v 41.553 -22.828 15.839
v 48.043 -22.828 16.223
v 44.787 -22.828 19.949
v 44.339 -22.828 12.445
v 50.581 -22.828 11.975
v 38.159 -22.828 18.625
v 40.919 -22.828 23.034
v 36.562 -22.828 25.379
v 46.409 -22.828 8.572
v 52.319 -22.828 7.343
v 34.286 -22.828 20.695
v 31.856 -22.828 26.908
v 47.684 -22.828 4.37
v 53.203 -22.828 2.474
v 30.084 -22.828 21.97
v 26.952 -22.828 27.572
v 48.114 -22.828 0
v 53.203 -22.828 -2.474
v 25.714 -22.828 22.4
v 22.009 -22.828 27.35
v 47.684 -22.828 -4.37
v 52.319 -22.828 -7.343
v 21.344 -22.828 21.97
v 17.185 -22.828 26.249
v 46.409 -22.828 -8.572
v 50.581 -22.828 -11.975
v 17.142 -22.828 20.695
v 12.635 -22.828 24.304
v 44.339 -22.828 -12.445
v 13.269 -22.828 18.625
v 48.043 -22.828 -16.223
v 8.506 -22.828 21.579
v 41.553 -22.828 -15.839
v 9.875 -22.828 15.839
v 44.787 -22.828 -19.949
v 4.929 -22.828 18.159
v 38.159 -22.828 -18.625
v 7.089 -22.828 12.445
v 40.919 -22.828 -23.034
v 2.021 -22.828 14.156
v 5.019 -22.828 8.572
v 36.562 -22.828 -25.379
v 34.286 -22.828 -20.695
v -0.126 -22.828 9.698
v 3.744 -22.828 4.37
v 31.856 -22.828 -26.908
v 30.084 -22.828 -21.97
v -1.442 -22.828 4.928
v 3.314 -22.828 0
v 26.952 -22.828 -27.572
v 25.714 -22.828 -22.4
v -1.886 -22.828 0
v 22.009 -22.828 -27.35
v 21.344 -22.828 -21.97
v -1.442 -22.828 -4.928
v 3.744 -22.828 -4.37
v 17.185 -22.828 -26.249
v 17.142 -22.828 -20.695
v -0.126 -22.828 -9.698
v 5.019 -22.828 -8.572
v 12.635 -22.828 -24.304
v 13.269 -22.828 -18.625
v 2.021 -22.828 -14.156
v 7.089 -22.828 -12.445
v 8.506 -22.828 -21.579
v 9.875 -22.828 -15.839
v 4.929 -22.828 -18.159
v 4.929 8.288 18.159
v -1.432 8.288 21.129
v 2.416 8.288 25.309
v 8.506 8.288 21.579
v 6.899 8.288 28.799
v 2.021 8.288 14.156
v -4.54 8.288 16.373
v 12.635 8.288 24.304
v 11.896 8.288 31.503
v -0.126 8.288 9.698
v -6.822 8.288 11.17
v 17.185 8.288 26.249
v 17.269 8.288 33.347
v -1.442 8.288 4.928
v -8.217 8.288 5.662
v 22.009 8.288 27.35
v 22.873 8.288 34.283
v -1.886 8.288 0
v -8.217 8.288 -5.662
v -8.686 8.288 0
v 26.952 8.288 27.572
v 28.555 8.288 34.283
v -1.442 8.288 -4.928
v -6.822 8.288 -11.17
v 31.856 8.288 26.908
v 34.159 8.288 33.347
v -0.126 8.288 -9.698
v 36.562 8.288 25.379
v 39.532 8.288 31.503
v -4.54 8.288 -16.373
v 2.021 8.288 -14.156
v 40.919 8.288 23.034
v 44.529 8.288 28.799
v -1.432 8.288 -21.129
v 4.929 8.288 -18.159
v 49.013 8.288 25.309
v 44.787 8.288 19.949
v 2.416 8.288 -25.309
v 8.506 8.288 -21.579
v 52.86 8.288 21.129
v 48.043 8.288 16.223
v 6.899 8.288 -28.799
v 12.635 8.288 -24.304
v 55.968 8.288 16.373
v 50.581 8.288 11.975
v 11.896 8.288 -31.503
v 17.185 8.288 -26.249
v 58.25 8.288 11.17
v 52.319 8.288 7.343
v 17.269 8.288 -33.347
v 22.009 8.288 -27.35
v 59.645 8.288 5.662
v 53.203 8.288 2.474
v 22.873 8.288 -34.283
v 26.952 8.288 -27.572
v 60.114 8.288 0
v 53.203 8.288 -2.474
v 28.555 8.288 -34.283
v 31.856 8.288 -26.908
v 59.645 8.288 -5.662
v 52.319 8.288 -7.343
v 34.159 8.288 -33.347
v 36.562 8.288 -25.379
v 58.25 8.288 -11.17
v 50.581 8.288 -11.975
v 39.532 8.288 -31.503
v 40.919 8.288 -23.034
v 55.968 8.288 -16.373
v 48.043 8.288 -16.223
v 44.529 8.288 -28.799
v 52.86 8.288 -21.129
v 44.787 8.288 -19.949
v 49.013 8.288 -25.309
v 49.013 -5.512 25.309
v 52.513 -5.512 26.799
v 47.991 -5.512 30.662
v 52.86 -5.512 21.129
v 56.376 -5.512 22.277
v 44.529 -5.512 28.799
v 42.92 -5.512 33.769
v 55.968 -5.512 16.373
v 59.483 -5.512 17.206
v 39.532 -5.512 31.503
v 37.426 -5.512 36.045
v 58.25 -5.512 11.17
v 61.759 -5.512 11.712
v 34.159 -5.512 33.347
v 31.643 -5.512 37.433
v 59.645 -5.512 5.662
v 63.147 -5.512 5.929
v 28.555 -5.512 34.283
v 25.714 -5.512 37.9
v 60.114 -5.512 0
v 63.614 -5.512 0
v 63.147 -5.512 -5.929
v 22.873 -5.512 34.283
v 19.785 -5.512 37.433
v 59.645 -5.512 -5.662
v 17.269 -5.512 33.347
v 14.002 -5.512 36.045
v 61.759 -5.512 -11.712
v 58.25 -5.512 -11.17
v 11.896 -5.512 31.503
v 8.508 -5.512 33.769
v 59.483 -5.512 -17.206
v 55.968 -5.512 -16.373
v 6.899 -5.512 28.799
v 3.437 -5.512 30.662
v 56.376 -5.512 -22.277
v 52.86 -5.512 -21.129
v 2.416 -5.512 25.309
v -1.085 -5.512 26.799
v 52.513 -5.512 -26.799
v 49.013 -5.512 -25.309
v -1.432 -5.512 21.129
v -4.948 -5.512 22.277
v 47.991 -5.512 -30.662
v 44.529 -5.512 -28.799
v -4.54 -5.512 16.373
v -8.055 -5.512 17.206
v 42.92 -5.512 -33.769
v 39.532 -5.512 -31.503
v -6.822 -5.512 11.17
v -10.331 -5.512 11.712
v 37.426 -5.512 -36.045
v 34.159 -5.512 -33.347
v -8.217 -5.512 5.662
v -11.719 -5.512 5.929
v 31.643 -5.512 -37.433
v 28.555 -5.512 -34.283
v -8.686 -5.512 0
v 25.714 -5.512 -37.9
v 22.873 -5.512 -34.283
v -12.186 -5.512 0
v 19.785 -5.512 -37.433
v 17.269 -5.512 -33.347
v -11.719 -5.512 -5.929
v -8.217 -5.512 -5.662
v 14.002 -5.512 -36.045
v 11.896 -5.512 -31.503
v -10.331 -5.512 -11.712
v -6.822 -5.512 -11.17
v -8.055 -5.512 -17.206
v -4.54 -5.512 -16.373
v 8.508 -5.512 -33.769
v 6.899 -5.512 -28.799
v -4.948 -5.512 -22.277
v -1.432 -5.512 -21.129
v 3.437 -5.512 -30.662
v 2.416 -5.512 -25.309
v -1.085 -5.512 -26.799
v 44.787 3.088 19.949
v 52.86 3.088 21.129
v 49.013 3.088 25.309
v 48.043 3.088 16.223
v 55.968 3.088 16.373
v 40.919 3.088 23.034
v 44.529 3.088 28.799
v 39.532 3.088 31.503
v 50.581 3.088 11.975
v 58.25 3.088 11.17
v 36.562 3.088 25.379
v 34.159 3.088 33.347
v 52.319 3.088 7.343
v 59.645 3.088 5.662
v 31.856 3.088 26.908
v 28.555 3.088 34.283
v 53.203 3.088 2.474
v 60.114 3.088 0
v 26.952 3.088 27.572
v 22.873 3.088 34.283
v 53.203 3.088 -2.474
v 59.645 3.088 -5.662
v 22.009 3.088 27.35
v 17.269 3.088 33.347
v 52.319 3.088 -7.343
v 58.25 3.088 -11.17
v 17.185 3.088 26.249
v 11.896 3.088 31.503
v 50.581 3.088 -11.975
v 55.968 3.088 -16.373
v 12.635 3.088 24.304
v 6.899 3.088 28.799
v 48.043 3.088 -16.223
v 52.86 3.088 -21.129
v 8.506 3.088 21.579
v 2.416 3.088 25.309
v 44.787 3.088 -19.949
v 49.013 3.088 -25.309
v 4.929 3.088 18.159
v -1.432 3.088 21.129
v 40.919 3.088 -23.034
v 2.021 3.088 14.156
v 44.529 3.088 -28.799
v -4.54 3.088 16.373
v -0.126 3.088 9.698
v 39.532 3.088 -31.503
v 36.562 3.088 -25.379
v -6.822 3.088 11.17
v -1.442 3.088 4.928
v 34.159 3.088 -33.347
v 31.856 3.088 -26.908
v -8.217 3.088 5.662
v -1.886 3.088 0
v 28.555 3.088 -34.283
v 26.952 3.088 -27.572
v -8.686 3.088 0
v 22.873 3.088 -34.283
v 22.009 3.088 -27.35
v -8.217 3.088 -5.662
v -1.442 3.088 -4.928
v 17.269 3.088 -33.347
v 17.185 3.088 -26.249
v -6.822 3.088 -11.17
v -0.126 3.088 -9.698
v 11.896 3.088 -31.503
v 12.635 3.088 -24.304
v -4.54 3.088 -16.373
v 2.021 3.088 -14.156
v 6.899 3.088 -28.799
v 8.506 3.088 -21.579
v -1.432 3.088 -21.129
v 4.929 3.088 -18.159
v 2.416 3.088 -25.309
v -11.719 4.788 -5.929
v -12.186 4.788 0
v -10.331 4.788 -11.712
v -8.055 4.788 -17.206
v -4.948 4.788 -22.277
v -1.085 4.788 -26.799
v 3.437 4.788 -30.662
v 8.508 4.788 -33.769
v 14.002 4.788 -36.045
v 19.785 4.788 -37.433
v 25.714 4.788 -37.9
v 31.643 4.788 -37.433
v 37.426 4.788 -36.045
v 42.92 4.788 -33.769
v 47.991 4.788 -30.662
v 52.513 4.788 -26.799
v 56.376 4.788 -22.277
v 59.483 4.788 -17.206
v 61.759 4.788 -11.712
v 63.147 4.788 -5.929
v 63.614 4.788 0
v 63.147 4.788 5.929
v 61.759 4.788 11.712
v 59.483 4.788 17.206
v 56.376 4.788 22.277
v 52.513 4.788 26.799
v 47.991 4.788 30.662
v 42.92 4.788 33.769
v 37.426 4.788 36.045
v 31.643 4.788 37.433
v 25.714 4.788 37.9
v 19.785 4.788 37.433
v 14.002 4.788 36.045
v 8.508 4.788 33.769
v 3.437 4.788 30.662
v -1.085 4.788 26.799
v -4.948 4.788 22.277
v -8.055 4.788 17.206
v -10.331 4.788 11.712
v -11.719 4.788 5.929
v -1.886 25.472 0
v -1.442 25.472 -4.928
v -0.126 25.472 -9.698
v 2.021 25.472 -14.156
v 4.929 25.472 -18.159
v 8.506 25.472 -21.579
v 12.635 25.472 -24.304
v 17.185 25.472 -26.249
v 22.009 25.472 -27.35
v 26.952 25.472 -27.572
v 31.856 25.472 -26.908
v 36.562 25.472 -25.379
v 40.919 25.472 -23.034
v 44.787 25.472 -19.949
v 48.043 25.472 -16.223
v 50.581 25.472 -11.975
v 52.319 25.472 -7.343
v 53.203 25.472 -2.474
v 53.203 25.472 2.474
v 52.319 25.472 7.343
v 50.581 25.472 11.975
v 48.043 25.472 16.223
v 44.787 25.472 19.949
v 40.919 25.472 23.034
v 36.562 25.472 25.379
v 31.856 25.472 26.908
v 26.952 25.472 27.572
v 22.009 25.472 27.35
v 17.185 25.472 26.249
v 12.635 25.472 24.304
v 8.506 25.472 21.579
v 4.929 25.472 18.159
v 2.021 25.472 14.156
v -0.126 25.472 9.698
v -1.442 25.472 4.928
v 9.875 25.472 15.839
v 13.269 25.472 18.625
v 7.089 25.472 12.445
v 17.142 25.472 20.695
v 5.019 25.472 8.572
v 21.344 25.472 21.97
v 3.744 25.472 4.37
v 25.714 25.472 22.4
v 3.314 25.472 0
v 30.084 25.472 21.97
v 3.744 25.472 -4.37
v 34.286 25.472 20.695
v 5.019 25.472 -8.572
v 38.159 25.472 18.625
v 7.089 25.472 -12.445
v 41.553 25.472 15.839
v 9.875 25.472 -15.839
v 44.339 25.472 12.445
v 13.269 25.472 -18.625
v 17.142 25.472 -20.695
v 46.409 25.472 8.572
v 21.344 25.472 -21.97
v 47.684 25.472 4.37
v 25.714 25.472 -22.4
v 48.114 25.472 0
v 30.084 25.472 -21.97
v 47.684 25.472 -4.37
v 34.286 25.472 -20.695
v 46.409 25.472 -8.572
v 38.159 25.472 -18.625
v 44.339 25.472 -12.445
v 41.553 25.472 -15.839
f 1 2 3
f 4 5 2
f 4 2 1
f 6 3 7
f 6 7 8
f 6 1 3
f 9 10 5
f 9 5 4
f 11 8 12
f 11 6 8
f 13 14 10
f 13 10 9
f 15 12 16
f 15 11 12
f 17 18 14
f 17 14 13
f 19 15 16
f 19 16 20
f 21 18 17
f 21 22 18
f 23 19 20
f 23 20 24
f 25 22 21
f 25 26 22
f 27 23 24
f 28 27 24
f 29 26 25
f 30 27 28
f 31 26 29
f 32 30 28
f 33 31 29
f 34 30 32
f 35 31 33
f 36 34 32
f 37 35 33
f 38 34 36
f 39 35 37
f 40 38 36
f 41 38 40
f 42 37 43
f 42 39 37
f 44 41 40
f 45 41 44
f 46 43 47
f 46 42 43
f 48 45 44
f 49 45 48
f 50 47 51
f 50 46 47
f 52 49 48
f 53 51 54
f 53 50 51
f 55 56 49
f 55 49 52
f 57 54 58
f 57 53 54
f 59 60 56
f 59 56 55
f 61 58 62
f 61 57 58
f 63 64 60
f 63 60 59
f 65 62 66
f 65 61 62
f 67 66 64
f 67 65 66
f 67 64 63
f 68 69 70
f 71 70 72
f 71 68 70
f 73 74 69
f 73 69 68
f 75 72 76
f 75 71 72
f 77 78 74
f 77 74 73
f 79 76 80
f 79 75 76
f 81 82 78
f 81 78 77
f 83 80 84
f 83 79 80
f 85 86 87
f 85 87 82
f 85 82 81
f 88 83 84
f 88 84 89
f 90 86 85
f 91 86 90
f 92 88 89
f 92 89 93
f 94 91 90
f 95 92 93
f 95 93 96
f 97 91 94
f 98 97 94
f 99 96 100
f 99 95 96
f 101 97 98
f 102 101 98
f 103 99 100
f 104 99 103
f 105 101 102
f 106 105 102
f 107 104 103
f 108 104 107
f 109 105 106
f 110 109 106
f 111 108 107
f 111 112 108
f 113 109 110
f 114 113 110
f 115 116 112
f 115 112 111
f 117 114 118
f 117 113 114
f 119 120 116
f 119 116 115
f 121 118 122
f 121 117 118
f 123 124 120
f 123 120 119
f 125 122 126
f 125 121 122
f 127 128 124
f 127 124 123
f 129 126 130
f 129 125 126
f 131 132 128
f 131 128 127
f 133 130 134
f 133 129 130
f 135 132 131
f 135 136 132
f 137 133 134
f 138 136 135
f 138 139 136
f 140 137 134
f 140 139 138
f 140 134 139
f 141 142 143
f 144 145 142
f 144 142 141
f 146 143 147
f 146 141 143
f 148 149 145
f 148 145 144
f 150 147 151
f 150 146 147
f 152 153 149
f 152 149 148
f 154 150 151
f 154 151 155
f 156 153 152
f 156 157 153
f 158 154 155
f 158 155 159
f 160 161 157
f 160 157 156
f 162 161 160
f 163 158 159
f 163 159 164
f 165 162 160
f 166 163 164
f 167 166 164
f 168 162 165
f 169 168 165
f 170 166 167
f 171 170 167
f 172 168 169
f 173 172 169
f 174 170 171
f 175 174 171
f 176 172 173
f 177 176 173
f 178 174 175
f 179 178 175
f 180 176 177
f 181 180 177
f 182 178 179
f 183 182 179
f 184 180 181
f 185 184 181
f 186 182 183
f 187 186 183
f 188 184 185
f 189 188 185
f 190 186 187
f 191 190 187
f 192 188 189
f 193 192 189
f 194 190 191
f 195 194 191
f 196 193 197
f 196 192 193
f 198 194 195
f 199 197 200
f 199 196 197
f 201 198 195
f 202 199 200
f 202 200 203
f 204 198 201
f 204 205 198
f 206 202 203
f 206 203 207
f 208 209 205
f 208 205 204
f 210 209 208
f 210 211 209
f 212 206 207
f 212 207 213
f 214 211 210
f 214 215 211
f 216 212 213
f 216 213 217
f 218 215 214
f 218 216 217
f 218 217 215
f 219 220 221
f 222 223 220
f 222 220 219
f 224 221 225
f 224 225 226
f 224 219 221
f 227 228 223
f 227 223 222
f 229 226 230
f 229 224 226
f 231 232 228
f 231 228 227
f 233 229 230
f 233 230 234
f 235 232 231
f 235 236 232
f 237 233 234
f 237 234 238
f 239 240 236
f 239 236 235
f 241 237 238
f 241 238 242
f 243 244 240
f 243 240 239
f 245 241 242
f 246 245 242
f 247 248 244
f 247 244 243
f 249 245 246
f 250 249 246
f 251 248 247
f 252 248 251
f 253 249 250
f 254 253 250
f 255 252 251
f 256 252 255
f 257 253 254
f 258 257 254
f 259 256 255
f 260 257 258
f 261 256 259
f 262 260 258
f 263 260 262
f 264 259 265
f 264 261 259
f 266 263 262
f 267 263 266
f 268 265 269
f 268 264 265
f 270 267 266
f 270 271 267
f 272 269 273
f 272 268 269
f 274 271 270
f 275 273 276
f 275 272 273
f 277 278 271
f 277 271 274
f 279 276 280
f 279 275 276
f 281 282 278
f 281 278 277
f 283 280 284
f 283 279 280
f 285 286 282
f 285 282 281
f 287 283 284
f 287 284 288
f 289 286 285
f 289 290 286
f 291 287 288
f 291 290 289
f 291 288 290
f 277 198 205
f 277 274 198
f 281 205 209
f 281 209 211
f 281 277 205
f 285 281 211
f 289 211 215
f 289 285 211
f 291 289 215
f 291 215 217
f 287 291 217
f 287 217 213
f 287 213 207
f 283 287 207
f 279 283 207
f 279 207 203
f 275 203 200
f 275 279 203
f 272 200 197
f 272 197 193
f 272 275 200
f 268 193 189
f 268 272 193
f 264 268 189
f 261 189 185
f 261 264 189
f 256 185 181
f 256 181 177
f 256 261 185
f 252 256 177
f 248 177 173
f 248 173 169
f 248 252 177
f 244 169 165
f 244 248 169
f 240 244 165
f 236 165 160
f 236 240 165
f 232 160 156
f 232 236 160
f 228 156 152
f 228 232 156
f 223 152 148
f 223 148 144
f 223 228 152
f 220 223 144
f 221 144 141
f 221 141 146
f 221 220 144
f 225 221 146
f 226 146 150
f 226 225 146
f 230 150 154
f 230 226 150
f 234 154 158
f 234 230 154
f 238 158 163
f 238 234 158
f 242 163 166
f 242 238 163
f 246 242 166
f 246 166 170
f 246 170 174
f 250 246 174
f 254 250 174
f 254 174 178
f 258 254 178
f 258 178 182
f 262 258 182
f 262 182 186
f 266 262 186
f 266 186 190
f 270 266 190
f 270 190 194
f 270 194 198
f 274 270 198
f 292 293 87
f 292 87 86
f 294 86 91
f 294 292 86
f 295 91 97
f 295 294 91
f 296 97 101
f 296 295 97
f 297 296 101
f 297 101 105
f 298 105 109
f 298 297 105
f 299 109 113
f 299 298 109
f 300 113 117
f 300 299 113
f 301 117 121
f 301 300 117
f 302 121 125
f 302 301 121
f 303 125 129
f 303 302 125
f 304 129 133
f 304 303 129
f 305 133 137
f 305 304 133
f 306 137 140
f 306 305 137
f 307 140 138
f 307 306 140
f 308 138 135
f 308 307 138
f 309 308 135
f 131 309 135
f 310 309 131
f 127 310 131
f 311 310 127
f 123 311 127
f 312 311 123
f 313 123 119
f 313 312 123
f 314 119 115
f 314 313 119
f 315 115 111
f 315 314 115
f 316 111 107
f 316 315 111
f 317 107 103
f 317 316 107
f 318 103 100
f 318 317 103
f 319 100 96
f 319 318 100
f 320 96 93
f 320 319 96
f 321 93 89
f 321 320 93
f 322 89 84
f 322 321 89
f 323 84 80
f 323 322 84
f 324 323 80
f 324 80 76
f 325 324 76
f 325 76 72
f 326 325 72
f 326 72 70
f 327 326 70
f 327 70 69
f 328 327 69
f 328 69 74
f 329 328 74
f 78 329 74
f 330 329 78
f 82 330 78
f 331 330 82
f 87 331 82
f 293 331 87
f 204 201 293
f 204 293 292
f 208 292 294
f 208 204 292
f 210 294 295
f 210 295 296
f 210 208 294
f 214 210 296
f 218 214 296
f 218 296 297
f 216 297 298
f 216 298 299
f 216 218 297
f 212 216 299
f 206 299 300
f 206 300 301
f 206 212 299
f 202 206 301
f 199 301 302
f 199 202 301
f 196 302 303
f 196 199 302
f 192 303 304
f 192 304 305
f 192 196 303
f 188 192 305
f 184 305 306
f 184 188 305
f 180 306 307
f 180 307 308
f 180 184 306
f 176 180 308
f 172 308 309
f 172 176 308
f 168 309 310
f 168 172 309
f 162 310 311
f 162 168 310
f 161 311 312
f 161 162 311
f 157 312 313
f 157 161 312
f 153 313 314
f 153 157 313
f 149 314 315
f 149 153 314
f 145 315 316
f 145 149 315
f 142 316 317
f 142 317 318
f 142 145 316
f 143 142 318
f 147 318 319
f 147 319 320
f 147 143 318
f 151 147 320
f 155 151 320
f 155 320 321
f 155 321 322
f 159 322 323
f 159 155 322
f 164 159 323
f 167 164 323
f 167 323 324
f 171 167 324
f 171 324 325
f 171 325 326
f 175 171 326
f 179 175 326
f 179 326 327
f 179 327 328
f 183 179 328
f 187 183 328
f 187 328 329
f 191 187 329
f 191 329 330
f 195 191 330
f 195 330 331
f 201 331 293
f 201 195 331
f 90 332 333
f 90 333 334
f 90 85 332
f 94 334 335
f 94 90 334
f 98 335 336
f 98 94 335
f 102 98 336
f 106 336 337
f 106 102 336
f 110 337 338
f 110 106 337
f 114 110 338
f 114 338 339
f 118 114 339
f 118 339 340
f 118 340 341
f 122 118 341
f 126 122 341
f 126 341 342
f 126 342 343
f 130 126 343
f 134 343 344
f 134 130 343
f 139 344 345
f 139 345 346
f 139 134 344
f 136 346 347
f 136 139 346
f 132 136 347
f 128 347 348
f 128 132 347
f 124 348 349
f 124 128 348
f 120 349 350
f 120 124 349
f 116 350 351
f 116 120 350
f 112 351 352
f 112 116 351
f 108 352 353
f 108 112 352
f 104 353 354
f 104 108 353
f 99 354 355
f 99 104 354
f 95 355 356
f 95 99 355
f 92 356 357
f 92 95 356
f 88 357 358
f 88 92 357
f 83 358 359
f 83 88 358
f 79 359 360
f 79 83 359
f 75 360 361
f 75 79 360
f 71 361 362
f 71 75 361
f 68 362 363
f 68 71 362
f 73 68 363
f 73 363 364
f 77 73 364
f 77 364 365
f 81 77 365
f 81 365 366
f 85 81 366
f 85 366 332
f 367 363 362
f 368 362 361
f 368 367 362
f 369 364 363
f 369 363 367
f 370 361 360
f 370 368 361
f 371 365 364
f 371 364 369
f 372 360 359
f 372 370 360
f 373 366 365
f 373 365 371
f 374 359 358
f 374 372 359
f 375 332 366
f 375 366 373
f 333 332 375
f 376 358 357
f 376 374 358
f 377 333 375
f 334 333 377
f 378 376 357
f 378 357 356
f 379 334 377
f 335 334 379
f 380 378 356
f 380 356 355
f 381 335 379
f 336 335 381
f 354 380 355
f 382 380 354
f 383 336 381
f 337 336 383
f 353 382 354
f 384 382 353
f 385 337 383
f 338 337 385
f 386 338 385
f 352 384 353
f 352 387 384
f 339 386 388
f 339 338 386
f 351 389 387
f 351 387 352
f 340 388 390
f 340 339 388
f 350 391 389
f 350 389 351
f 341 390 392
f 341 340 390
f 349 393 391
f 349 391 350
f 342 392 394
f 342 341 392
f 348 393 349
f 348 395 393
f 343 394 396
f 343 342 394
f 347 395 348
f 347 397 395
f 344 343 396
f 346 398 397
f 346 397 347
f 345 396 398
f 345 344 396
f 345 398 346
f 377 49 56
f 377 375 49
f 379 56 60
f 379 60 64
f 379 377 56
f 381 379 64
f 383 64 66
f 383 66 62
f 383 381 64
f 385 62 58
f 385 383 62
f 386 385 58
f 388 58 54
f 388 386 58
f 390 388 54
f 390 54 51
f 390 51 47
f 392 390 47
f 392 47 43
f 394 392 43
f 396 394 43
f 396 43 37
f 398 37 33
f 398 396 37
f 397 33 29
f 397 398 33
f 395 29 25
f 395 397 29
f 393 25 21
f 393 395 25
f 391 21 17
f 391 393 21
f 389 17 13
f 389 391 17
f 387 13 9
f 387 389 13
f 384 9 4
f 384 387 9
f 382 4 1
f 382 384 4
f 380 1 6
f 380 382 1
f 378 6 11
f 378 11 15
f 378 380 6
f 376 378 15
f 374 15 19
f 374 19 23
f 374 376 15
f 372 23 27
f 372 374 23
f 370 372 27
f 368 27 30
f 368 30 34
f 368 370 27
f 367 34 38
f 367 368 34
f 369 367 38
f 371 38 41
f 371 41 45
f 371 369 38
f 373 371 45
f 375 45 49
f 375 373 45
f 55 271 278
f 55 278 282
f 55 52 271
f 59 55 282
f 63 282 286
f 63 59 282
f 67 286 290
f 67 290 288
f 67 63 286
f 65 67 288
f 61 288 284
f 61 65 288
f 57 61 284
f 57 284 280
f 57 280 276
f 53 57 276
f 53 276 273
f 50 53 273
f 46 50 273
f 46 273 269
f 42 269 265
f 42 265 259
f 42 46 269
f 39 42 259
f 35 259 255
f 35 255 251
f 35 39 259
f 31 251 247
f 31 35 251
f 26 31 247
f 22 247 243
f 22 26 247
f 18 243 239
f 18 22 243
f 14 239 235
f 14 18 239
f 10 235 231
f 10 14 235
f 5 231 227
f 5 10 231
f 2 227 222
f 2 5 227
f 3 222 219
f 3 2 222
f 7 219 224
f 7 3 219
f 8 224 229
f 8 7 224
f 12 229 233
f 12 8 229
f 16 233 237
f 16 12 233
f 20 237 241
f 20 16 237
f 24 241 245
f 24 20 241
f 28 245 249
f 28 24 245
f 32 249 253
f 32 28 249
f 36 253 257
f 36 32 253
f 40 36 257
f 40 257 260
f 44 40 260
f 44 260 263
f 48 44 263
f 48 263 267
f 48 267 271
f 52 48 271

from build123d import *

# Parameters (mm, degrees)
CHAMFER1_SIZE = 3.5


with BuildPart() as part:
    # Sketch1 → Revolve2 (revolve)
    with BuildSketch(Plane.XY):
        Polygon((-8.685956571, 3.088170612), (-1.885956571, 3.088170612), (-1.885956571, -22.827972222), (3.314043429, -22.827972222), (3.314043429, 25.472027778), (-1.885956571, 25.472027778), (-1.885956571, 8.288170612), (-12.185956571, 8.288170612), (-12.185956571, 3.088170612), (-12.185956571, -5.511829388), (-8.685956571, -5.511829388), align=None)
    revolve(axis=Axis((25.714043429, 25.472027778, 0), (0, -1, 0)))

    # Chamfer1
    chamfer1_edges = [part.edges().sort_by_distance(p)[0] for p in [
        (63.614043429, 8.288170612, 0),
    ]]
    chamfer(chamfer1_edges, length=CHAMFER1_SIZE)


solid = part.part
